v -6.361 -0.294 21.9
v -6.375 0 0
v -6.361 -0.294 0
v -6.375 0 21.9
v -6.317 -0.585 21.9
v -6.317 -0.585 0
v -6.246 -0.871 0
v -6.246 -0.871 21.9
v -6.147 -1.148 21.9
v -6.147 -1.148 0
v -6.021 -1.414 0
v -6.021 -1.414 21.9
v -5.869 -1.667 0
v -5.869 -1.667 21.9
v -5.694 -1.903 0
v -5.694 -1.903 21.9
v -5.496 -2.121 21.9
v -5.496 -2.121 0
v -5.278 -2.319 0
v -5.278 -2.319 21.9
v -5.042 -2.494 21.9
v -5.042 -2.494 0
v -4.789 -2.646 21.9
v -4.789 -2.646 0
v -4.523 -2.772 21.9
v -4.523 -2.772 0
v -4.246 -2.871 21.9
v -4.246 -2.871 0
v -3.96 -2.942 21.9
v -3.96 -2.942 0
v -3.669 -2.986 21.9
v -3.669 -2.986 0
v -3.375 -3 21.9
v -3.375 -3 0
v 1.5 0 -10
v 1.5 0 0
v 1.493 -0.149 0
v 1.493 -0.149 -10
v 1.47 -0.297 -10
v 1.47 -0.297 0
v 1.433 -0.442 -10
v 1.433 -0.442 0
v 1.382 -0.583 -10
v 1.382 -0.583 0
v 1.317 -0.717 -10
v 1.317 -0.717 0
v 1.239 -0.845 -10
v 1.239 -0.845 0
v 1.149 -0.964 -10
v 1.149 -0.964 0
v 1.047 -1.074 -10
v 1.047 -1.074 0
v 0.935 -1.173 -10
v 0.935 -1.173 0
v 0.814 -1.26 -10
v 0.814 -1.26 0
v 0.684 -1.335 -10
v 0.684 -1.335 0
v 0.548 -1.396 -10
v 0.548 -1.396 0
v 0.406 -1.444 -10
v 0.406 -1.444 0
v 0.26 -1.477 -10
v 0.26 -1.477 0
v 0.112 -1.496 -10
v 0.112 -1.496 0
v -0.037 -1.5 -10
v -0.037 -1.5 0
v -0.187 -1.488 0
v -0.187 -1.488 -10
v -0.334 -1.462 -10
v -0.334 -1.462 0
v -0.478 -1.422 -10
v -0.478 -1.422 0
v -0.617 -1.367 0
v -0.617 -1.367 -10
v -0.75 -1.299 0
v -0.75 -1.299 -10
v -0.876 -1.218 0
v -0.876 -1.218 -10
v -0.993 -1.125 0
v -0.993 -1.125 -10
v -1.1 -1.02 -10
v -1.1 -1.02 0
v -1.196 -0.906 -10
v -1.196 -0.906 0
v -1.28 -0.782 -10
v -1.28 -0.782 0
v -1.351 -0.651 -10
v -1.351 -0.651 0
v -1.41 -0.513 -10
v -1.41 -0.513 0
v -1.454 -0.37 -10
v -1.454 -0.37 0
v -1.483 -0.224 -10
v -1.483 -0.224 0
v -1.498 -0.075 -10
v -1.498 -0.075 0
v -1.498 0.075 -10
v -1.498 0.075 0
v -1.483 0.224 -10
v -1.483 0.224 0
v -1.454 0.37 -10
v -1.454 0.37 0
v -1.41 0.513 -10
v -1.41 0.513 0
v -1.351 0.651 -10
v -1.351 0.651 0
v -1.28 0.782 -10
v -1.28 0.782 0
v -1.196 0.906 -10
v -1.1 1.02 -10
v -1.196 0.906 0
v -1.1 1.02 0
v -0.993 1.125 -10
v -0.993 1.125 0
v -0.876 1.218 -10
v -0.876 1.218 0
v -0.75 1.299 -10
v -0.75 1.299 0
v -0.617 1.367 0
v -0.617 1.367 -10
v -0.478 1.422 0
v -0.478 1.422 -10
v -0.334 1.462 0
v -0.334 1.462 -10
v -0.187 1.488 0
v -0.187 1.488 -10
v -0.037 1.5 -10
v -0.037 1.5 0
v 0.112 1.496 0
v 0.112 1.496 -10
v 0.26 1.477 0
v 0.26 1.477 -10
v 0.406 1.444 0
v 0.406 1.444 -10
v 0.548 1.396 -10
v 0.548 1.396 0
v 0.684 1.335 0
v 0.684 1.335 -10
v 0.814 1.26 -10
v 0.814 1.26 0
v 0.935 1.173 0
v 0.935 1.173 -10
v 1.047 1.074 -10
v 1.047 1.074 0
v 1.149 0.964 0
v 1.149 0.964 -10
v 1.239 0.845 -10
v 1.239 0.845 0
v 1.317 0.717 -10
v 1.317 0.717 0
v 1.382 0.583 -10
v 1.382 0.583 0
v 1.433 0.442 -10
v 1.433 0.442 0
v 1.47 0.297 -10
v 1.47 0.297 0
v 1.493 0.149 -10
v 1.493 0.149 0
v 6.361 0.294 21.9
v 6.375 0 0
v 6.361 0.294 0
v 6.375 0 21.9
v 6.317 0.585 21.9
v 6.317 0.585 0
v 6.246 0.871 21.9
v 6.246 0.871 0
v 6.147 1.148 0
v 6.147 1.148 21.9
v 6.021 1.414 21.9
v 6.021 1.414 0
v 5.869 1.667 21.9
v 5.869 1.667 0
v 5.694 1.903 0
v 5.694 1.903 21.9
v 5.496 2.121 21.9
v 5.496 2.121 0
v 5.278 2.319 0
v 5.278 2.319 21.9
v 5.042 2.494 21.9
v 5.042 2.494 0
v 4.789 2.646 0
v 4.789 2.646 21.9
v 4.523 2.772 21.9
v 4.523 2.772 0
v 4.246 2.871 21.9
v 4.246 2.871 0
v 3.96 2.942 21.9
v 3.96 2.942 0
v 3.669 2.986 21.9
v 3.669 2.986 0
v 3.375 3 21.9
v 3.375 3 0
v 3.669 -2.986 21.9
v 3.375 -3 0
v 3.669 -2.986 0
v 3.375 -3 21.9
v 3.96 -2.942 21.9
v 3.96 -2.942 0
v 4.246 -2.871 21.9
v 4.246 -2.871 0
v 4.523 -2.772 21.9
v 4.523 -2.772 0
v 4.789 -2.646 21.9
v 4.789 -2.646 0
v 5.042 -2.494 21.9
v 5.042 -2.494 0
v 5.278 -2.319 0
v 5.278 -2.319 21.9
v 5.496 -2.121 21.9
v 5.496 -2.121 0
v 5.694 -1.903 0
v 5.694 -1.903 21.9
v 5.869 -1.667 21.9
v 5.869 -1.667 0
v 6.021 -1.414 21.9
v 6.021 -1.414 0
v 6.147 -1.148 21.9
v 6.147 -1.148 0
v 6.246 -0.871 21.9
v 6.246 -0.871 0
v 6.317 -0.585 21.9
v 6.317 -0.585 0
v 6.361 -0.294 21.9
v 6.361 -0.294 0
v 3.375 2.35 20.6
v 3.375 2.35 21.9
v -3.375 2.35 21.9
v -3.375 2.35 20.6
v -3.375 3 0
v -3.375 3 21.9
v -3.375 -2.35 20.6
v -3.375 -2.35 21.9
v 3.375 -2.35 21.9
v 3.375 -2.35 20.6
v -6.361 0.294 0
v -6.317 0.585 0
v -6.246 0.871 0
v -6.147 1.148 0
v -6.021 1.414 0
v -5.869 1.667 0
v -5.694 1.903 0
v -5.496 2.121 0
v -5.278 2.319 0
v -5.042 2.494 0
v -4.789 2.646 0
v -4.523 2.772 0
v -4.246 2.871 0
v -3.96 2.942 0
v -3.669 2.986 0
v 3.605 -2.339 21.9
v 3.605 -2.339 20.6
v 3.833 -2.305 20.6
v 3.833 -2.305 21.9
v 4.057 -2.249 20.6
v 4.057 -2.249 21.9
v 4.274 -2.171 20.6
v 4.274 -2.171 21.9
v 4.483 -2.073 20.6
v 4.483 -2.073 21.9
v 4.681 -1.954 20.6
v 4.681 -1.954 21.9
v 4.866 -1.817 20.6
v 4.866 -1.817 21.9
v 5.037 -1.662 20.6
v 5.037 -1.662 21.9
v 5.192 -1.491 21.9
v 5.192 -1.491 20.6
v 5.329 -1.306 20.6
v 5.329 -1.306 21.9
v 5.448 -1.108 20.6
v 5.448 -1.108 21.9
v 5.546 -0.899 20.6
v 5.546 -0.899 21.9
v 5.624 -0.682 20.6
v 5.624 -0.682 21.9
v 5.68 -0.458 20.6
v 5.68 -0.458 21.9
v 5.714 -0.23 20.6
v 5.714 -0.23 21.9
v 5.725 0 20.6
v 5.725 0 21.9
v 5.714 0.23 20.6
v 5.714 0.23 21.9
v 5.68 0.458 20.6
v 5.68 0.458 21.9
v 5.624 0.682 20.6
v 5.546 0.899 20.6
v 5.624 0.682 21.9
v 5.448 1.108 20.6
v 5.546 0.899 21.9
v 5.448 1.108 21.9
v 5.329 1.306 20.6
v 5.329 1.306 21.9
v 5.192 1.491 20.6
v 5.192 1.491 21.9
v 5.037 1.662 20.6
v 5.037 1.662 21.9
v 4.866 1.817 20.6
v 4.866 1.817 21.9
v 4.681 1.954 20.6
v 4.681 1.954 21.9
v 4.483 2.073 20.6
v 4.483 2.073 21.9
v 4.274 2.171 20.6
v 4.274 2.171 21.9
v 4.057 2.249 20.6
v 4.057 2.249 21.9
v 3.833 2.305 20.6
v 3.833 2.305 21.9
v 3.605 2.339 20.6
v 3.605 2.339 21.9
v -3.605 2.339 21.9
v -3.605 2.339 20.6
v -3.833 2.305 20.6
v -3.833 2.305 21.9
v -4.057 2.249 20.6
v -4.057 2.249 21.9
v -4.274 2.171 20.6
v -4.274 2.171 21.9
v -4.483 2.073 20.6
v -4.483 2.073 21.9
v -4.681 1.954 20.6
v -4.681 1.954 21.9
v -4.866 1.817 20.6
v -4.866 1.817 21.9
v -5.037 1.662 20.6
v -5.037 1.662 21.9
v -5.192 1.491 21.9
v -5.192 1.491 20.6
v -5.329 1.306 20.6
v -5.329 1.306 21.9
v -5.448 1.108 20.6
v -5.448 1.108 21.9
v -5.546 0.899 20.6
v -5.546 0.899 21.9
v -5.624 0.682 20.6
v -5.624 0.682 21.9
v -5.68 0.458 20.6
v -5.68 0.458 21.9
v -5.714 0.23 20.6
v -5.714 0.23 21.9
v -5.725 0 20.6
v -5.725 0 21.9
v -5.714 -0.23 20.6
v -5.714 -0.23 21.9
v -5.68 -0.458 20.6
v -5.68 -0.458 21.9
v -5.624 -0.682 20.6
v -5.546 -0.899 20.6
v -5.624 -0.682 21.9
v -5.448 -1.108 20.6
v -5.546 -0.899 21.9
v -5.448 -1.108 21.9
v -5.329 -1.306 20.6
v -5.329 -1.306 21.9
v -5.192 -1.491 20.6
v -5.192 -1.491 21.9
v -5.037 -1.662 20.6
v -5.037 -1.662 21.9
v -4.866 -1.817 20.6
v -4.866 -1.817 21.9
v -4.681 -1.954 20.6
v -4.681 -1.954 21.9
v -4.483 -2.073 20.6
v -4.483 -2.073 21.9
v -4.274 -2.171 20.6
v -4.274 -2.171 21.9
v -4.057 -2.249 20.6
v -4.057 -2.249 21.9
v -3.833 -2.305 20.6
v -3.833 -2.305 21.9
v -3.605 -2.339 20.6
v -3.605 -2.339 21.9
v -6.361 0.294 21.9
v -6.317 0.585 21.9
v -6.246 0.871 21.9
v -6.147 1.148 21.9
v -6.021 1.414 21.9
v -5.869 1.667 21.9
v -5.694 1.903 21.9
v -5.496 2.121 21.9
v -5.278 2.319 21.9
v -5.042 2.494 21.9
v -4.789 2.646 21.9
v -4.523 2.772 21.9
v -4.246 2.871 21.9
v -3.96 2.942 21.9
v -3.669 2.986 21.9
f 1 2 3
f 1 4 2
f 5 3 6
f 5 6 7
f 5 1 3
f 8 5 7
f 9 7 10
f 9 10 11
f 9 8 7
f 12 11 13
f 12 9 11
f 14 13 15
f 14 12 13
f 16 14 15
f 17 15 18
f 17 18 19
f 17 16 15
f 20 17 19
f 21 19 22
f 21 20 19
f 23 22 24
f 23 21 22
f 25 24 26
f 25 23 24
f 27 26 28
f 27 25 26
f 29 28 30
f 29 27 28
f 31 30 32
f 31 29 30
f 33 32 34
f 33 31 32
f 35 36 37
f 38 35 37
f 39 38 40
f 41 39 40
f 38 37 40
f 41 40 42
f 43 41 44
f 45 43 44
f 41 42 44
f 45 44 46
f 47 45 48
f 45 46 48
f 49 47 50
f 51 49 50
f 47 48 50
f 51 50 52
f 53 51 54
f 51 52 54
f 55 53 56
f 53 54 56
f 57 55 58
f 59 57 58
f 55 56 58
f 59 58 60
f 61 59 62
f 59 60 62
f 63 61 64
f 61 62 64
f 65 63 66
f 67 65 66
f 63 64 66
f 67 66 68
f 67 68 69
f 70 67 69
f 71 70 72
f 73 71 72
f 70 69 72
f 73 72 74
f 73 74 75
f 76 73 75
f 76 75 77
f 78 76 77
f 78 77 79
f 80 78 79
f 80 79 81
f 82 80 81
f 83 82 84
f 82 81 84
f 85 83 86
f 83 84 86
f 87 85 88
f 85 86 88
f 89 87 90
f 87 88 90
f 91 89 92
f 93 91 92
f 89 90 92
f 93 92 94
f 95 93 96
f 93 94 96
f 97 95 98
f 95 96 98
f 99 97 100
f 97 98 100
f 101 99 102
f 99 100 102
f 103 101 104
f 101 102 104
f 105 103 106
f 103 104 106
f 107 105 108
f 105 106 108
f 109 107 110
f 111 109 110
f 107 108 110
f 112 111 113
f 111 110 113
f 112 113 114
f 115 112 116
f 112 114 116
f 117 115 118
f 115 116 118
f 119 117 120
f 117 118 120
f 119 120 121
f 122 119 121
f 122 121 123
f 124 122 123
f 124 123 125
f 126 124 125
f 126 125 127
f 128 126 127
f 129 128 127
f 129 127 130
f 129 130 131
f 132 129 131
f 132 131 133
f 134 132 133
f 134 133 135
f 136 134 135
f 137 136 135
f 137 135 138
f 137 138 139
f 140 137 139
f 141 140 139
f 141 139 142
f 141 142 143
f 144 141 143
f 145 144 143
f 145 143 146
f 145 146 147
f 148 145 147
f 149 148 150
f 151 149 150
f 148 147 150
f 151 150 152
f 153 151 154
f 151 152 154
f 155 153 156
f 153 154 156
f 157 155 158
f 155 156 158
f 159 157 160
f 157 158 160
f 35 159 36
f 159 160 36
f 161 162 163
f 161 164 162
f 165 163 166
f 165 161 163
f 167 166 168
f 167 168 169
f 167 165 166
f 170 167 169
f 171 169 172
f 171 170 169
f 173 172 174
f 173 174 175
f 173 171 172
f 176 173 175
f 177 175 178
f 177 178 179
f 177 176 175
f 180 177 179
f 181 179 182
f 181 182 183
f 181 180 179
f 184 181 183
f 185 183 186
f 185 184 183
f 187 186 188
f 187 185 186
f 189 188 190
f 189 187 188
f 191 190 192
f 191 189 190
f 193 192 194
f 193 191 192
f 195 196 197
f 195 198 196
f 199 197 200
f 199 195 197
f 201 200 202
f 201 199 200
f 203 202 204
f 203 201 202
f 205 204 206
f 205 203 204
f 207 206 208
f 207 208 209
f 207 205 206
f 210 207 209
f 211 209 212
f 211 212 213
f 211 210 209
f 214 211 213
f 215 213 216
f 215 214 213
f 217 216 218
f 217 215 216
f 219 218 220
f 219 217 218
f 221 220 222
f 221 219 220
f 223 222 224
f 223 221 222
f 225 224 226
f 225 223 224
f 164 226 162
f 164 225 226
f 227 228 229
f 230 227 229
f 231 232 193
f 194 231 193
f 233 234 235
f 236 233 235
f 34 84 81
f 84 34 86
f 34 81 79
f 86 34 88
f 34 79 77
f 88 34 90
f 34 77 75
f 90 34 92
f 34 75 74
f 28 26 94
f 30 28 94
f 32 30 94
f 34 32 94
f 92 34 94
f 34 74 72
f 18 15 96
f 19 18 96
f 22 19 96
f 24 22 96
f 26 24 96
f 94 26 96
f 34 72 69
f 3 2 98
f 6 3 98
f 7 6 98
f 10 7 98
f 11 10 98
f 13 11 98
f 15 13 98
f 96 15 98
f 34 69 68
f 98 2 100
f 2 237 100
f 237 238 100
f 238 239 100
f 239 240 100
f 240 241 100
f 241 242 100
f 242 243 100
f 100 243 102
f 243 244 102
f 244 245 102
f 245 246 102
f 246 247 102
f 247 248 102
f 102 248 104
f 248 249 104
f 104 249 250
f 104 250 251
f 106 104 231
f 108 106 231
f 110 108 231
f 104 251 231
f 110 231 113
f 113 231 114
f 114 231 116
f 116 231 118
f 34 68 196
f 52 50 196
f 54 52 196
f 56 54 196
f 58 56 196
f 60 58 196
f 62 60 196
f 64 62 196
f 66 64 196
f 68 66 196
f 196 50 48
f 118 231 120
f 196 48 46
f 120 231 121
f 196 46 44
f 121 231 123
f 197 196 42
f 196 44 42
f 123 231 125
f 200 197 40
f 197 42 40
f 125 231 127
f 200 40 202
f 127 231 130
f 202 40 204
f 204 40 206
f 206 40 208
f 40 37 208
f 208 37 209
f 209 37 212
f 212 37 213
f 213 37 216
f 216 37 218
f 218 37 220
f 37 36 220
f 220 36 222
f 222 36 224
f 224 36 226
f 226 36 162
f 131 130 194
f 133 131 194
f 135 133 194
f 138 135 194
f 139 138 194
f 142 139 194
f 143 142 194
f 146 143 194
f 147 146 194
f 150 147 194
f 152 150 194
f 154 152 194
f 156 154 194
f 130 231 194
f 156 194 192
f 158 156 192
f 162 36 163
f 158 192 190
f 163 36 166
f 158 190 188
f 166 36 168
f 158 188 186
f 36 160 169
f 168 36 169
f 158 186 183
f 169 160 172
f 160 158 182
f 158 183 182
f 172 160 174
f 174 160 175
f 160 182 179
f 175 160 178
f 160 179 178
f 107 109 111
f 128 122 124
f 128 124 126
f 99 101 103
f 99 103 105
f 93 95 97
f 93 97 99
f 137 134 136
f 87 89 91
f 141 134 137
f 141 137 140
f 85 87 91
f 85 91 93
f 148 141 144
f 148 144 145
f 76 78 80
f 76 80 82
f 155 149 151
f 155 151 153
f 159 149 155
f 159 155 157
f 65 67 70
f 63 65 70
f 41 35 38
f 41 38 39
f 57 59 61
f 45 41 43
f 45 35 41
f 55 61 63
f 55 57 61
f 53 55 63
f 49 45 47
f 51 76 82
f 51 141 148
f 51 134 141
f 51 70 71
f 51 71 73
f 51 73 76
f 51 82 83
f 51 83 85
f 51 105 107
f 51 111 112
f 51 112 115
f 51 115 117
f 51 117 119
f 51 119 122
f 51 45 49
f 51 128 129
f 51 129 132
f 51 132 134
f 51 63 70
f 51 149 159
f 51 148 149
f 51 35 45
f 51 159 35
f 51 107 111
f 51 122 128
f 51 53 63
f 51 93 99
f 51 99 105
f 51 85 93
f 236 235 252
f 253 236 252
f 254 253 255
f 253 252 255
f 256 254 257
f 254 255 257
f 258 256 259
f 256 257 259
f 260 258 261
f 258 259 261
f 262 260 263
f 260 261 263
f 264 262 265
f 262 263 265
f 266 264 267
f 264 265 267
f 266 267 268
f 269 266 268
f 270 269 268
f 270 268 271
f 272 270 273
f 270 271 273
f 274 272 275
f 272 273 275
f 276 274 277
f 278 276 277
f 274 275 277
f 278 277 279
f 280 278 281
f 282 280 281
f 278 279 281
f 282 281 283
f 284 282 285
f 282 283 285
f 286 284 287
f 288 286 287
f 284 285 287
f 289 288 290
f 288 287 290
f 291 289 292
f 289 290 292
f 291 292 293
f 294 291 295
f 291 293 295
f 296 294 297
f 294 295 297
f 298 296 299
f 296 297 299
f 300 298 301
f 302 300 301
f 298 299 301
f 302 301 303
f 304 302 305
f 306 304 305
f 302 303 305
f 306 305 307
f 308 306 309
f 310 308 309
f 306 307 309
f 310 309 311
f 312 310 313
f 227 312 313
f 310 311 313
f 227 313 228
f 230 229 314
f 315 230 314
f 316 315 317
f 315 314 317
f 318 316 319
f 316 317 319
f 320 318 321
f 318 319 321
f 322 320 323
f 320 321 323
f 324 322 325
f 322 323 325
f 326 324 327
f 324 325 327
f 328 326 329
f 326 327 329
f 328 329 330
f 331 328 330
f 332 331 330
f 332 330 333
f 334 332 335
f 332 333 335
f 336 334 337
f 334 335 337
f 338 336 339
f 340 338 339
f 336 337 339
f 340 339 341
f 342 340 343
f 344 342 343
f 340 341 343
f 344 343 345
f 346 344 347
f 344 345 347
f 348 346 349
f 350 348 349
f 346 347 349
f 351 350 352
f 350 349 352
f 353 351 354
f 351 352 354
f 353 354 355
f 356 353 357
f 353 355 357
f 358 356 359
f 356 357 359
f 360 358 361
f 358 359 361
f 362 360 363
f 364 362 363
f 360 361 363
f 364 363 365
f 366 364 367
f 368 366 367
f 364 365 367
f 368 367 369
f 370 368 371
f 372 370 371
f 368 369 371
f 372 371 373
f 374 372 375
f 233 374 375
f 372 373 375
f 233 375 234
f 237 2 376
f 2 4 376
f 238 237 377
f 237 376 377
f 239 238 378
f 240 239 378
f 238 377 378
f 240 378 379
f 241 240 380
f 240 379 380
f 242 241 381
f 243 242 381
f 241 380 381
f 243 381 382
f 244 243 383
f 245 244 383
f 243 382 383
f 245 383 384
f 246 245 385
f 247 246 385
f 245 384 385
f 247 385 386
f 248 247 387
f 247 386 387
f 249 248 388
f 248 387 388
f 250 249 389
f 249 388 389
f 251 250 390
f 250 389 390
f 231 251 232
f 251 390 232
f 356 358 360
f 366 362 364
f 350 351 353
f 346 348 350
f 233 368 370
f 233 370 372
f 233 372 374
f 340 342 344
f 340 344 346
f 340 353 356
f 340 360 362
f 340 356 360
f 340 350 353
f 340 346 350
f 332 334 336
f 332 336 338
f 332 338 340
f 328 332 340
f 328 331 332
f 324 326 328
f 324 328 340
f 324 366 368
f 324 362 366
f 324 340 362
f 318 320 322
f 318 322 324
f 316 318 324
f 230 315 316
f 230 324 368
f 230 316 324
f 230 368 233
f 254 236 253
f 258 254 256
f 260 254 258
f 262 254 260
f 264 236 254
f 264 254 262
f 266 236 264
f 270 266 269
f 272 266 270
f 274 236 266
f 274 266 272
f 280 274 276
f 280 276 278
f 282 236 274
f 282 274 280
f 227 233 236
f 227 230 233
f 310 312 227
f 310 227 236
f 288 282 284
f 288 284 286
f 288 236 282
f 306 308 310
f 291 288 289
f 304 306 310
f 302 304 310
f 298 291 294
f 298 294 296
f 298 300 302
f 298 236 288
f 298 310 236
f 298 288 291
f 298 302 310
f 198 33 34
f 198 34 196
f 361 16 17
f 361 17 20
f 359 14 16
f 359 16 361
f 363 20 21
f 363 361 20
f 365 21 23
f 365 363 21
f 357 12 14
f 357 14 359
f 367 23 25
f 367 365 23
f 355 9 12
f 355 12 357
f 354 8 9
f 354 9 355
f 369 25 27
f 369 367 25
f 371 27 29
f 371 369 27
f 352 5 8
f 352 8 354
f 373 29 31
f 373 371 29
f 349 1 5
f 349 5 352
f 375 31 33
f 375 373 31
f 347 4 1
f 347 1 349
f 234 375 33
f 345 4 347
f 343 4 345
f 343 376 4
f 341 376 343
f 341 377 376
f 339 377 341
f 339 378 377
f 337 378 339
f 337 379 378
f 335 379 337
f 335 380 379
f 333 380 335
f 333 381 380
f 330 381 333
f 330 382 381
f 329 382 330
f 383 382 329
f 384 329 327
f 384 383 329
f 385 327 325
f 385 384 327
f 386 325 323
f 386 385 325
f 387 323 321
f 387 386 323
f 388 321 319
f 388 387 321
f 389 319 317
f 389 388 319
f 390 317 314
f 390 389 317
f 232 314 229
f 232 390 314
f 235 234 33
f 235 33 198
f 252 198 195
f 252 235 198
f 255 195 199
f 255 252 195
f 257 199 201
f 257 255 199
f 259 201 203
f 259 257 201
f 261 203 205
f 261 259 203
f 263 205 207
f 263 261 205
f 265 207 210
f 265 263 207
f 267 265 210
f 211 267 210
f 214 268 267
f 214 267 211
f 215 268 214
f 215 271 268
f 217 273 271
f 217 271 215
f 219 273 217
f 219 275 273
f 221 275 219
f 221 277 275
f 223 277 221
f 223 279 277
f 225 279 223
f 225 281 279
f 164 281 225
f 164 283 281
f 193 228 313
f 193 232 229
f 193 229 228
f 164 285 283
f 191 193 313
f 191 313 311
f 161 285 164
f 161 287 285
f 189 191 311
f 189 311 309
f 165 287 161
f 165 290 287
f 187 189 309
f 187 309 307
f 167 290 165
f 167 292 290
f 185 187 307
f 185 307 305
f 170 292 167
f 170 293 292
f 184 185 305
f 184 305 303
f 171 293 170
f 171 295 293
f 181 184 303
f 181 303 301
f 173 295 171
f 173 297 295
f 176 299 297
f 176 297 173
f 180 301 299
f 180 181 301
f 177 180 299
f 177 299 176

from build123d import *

# Parameters (mm, degrees)
F0_W     = 12.75
F0_H     = 6
F1_DEPTH = 21.9
F2_R     = 2.99999
F3_R     = 1.5
F4_DEPTH = 10
F6_DEPTH = 1.3


# Not quite as in the source:
# - a fillet or chamfer is up to 0.001 mm smaller than in the source, because OpenCascade refuses the exact size


with BuildPart() as f1:
    # F0 (on Top) → F1 (new body)
    with BuildSketch(Plane.XY):
        Rectangle(F0_W, F0_H)
    extrude(amount=F1_DEPTH)

    # F2 (radius 3 in the source; OpenCascade refuses exactly that, so slightly less here)
    f2_edges = [f1.edges().sort_by_distance(p)[0] for p in [
        (-6.375, -3, 10.95),
        (-6.375, 3, 10.95),
        (6.375, -3, 10.95),
        (6.375, 3, 10.95),
    ]]
    fillet(f2_edges, radius=F2_R)

    # F3 (on face) → F4 (join)
    with BuildSketch(Plane(origin=(0, 0, 0), x_dir=(1, 0, 0), z_dir=(0, 0, -1))):
        Circle(F3_R)
    extrude(amount=F4_DEPTH)

    # F5 (on face) → F6 (cut)
    with BuildSketch(Plane.XY.offset(21.9)):
        with BuildLine():
            Line((3.375, 2.35), (-3.375, 2.35))
            ThreePointArc((-3.375, 2.35), (-5.725, 0), (-3.375, -2.35))
            Line((-3.375, -2.35), (3.375, -2.35))
            ThreePointArc((3.375, -2.35), (5.725, 0), (3.375, 2.35))
        make_face()
    extrude(amount=-F6_DEPTH, mode=Mode.SUBTRACT)


solid = f1.part
